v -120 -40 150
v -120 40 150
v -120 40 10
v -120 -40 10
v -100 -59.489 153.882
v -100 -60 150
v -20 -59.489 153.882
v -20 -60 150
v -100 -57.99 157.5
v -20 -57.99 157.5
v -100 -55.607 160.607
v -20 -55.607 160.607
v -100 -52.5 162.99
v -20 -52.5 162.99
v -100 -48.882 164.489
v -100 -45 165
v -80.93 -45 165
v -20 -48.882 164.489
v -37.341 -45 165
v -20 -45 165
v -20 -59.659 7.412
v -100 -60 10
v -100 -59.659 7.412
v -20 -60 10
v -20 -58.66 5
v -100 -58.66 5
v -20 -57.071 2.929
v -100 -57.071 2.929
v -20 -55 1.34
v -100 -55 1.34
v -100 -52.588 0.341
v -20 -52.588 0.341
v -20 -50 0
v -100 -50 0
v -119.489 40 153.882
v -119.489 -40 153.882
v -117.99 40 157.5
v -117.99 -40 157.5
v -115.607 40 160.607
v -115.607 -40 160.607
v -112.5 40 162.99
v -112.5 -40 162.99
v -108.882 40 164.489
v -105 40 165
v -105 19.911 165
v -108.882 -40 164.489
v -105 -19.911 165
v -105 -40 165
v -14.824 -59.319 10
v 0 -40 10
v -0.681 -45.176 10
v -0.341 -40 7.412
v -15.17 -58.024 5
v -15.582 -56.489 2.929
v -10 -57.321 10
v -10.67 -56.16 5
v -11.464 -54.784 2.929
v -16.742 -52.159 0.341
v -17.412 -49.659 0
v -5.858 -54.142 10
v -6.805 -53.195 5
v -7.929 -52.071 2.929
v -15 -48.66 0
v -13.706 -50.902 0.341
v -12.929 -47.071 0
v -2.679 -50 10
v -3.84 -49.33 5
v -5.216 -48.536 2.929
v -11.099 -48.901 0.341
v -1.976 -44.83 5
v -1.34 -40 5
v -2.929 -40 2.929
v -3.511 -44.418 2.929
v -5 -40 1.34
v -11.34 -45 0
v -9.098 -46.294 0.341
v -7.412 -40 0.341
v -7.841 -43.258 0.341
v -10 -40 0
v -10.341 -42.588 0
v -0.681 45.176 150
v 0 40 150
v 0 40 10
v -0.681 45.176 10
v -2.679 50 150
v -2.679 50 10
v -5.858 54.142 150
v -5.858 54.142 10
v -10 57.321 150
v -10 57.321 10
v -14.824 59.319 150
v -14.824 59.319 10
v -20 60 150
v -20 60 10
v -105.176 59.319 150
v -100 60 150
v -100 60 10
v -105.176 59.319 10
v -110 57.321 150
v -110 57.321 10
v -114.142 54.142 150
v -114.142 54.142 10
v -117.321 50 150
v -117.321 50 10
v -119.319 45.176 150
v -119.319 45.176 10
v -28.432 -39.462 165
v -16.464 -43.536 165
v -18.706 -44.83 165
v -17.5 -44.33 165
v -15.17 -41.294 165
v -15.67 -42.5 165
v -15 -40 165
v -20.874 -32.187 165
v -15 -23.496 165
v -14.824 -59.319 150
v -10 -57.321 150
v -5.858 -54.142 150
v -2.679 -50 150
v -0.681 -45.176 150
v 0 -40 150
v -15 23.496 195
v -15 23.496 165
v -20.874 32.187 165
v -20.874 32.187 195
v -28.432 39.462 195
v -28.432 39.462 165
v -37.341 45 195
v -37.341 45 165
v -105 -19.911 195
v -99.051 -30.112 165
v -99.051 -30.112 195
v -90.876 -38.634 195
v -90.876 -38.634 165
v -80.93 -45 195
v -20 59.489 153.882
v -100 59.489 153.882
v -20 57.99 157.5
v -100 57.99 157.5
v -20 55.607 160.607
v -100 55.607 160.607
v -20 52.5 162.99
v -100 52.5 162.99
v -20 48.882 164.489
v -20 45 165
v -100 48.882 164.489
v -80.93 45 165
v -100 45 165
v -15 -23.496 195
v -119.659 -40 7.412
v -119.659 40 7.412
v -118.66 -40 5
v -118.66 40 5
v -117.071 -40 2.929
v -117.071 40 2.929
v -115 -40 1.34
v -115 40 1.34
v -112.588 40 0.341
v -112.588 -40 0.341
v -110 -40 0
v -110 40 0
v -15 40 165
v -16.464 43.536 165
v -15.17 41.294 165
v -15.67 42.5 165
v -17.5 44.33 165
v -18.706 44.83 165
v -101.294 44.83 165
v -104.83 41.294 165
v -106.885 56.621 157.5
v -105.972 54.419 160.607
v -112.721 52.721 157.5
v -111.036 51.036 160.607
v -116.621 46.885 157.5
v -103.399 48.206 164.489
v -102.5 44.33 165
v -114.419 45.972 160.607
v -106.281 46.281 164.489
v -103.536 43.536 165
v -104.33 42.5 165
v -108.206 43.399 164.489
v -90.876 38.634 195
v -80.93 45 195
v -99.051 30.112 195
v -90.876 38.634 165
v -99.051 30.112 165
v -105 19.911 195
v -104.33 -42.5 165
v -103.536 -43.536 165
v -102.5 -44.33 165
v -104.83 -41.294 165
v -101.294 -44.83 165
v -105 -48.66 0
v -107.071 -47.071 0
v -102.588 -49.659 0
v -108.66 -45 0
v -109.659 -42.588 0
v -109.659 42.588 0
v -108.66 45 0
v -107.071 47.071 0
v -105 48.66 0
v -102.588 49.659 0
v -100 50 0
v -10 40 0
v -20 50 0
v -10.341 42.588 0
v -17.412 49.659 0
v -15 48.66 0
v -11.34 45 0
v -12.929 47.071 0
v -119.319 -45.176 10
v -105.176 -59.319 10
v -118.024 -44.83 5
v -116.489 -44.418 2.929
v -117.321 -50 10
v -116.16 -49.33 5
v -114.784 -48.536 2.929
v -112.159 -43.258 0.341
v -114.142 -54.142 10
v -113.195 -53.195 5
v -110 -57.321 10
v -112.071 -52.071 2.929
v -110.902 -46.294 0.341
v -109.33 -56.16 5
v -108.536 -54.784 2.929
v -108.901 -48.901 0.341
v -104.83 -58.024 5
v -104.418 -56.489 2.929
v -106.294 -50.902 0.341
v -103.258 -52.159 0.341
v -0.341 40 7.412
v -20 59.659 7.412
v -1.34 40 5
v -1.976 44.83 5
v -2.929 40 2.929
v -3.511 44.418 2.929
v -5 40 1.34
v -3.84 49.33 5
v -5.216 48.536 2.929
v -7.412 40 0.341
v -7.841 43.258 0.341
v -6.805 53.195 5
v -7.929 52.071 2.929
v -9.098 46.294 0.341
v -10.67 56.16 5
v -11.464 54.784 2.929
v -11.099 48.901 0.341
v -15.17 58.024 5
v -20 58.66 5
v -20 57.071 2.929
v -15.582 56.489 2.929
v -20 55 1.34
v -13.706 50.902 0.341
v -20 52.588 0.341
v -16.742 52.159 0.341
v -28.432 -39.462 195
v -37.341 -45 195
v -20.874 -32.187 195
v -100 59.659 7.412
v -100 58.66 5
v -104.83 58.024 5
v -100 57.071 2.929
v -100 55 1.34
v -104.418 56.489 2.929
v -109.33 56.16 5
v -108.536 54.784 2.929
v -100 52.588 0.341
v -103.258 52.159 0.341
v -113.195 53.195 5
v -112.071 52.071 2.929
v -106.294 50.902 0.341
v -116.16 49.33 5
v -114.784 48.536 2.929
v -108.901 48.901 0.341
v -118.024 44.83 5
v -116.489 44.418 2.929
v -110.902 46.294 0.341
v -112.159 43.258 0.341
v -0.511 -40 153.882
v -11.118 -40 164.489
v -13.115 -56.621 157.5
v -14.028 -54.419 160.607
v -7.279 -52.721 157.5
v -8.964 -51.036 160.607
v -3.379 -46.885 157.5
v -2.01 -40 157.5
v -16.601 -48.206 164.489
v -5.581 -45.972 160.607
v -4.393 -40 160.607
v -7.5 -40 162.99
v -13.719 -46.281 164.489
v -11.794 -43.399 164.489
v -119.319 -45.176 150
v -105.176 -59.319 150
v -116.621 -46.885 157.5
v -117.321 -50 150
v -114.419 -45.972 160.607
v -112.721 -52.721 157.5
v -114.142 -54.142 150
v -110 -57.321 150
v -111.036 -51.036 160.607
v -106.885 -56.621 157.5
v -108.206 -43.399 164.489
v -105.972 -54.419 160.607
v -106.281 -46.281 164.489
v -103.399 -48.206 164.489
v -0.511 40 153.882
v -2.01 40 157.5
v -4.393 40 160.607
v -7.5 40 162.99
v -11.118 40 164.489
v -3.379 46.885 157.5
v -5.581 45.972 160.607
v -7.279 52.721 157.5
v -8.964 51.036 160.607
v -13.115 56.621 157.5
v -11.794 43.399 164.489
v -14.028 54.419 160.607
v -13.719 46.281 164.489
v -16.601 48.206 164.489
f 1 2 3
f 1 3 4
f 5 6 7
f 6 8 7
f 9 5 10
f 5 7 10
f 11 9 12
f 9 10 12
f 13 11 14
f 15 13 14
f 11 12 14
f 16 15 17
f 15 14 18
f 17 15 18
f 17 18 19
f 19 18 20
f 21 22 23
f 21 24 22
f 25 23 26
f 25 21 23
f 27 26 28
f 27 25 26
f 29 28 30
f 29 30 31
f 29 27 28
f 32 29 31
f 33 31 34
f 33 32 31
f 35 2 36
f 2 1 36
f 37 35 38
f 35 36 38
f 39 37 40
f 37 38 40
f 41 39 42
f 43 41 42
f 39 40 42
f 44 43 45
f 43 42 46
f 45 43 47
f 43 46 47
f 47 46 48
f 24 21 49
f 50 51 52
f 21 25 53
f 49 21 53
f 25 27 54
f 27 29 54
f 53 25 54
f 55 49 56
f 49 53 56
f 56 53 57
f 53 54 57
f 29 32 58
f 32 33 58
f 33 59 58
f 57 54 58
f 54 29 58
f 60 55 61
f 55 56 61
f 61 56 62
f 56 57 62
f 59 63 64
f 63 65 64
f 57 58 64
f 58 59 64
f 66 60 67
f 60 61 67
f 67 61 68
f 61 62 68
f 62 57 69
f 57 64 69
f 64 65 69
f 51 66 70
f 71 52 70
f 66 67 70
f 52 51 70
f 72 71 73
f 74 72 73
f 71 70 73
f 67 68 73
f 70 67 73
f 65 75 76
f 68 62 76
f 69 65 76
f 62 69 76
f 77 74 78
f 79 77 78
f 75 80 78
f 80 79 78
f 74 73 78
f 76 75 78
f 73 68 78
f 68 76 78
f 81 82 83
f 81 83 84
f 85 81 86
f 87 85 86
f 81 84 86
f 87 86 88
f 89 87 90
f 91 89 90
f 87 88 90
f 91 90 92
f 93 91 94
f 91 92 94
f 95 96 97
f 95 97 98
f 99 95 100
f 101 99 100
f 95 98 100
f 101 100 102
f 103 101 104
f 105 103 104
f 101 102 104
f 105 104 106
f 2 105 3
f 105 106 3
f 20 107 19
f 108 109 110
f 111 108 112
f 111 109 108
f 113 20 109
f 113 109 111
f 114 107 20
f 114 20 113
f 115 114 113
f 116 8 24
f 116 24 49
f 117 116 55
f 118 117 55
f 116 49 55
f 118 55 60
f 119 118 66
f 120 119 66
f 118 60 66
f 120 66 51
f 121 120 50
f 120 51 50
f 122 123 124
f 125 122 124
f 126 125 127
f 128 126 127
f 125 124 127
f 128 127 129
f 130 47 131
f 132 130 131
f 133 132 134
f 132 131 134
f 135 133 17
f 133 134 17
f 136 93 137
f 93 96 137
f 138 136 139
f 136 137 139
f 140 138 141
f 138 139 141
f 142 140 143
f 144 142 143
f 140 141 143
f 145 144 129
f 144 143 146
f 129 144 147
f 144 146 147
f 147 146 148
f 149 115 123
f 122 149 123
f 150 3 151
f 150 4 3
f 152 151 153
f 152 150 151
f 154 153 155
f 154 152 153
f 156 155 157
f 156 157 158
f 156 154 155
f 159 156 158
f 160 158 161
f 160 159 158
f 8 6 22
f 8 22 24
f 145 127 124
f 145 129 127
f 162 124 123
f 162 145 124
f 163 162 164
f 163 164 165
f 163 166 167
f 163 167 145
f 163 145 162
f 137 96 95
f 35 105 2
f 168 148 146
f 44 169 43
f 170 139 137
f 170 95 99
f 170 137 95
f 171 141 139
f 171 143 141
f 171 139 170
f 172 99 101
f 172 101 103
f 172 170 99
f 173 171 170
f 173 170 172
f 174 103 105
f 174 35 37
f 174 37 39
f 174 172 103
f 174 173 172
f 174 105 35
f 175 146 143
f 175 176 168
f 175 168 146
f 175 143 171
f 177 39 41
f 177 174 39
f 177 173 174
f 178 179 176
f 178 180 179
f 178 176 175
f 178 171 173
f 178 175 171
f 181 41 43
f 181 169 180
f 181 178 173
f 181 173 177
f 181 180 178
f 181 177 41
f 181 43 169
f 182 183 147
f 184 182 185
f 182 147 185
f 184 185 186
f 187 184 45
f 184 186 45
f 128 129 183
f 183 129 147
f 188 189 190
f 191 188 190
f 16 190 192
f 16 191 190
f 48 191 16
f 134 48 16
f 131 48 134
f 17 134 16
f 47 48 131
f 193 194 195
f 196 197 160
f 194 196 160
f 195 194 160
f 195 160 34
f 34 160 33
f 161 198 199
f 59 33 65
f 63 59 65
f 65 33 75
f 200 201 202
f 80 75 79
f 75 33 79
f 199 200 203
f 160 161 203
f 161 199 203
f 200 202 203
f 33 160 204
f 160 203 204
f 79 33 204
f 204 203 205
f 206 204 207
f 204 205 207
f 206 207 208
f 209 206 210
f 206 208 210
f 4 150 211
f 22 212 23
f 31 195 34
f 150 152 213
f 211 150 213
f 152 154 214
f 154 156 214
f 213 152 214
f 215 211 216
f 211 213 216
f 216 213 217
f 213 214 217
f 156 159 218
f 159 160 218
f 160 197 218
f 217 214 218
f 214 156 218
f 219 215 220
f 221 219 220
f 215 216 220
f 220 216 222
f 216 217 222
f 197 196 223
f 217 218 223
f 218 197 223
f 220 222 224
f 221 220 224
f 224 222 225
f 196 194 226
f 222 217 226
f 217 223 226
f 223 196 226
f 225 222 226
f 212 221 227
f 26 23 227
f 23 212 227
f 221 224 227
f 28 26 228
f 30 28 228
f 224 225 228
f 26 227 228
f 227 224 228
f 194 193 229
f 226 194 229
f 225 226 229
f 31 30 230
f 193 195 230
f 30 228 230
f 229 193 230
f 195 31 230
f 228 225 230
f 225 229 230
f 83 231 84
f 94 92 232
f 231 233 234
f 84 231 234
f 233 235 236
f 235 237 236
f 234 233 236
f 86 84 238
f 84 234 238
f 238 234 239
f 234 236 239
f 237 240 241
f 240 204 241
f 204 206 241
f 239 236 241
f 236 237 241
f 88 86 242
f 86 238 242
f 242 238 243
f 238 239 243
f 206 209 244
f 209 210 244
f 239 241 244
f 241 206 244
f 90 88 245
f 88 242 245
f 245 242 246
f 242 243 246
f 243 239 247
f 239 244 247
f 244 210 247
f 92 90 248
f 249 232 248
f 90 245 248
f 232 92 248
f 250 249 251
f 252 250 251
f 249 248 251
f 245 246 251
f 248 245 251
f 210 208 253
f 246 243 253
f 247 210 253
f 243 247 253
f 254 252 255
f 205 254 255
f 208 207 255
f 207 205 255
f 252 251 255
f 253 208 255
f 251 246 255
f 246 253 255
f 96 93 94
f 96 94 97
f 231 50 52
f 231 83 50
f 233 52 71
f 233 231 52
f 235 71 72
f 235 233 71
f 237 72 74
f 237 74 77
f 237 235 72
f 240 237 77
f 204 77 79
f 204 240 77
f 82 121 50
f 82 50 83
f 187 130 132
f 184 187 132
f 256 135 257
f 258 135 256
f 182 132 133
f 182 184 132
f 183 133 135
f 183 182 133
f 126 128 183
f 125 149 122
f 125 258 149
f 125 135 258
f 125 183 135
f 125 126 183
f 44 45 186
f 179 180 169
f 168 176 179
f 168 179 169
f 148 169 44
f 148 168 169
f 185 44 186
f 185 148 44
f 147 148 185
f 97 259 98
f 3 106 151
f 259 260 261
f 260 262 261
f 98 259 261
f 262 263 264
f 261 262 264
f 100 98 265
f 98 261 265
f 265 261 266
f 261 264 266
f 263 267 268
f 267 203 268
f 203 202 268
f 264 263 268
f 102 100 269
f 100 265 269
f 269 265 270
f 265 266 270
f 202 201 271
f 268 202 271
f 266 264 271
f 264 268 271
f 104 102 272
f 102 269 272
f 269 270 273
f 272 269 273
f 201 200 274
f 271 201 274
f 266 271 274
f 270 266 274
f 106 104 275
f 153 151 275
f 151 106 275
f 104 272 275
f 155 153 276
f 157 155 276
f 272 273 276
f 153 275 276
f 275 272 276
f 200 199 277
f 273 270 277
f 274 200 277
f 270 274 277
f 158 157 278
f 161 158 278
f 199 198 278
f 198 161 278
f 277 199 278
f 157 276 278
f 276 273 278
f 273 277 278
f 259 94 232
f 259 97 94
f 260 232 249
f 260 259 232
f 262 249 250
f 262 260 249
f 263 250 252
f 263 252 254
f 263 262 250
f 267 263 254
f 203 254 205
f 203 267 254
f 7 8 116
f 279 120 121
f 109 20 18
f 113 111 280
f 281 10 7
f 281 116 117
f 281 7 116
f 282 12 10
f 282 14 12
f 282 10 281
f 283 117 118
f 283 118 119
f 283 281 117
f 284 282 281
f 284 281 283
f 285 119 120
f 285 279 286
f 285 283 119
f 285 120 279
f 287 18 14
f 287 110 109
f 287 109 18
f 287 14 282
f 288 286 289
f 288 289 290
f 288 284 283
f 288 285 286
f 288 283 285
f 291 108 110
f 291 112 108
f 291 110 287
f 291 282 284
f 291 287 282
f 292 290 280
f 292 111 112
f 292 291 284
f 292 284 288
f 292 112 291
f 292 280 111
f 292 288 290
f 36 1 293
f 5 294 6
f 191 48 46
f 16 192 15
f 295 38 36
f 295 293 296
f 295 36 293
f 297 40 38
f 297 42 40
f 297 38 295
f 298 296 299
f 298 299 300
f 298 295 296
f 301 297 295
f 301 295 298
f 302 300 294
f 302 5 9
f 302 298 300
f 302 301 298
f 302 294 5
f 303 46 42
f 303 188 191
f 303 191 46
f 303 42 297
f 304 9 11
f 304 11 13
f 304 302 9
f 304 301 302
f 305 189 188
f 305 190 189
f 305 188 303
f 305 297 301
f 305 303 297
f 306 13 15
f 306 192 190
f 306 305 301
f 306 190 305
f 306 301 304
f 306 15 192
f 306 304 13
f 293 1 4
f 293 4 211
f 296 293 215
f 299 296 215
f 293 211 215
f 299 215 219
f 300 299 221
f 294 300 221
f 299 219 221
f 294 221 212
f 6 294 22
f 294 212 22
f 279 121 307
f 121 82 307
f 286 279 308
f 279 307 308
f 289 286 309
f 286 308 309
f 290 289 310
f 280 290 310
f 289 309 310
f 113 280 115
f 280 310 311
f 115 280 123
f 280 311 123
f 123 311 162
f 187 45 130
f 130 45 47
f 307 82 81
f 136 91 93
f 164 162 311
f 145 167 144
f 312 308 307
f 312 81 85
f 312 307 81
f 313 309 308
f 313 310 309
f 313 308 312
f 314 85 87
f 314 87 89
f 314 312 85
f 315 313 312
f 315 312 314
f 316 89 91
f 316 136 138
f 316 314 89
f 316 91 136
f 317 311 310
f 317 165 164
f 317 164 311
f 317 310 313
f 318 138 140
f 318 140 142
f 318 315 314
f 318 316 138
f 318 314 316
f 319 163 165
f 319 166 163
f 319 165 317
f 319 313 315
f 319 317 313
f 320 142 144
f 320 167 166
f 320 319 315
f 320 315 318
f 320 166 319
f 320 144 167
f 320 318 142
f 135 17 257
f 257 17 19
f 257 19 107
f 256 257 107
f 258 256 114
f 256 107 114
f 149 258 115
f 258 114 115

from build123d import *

# Parameters (mm, degrees)
F1_DEPTH = 165
F2_R     = 10
F3_R     = 15
F5_DEPTH = 30


with BuildPart() as f1:
    # F0 (on Top) → F1 (new body)
    with BuildSketch(Plane.XY):
        with BuildLine():
            Line((-20, 60), (-100, 60))
            ThreePointArc((-100, 60), (-114.1421356237, 54.1421356237), (-120, 40))
            Line((-120, 40), (-120, -40))
            ThreePointArc((-120, -40), (-114.1421356237, -54.1421356237), (-100, -60))
            Line((-100, -60), (-20, -60))
            ThreePointArc((-20, -60), (-5.8578643763, -54.1421356237), (0, -40))
            Line((0, -40), (0, 40))
            ThreePointArc((0, 40), (-5.8578643763, 54.1421356237), (-20, 60))
        make_face()
    extrude(amount=F1_DEPTH)

    # F2
    f2_edges = [f1.edges().sort_by_distance(p)[0] for p in [
        (-60, -60, 0),
        (-114.142136, -54.142136, 0),
        (-5.857864, -54.142136, 0),
    ]]
    fillet(f2_edges, radius=F2_R)

    # F3
    f3_edges = [f1.edges().sort_by_distance(p)[0] for p in [
        (-60, 60, 165),
    ]]
    fillet(f3_edges, radius=F3_R)

    # F4 (on face) → F5 (join)
    with BuildSketch(Plane.XY.offset(165)):
        with BuildLine():
            Line((-15, -23.4956587879), (-15, 23.4956587879))
            ThreePointArc((-15, 23.4956587879), (-24.4613681652, 36.0235398418), (-37.3411373512, 45))
            Line((-37.3411373512, 45), (-80.9301267866, 45))
            ThreePointArc((-80.9301267866, 45), (-95.2159754206, 34.6151530926), (-105, 19.9112971522))
            Line((-105, 19.9112971522), (-105, -19.9112971522))
            ThreePointArc((-105, -19.9112971522), (-95.2159754206, -34.6151530926), (-80.9301267866, -45))
            Line((-80.9301267866, -45), (-37.3411373512, -45))
            ThreePointArc((-37.3411373512, -45), (-24.4613681652, -36.0235398418), (-15, -23.4956587879))
        make_face()
    extrude(amount=F5_DEPTH)


solid = f1.part
